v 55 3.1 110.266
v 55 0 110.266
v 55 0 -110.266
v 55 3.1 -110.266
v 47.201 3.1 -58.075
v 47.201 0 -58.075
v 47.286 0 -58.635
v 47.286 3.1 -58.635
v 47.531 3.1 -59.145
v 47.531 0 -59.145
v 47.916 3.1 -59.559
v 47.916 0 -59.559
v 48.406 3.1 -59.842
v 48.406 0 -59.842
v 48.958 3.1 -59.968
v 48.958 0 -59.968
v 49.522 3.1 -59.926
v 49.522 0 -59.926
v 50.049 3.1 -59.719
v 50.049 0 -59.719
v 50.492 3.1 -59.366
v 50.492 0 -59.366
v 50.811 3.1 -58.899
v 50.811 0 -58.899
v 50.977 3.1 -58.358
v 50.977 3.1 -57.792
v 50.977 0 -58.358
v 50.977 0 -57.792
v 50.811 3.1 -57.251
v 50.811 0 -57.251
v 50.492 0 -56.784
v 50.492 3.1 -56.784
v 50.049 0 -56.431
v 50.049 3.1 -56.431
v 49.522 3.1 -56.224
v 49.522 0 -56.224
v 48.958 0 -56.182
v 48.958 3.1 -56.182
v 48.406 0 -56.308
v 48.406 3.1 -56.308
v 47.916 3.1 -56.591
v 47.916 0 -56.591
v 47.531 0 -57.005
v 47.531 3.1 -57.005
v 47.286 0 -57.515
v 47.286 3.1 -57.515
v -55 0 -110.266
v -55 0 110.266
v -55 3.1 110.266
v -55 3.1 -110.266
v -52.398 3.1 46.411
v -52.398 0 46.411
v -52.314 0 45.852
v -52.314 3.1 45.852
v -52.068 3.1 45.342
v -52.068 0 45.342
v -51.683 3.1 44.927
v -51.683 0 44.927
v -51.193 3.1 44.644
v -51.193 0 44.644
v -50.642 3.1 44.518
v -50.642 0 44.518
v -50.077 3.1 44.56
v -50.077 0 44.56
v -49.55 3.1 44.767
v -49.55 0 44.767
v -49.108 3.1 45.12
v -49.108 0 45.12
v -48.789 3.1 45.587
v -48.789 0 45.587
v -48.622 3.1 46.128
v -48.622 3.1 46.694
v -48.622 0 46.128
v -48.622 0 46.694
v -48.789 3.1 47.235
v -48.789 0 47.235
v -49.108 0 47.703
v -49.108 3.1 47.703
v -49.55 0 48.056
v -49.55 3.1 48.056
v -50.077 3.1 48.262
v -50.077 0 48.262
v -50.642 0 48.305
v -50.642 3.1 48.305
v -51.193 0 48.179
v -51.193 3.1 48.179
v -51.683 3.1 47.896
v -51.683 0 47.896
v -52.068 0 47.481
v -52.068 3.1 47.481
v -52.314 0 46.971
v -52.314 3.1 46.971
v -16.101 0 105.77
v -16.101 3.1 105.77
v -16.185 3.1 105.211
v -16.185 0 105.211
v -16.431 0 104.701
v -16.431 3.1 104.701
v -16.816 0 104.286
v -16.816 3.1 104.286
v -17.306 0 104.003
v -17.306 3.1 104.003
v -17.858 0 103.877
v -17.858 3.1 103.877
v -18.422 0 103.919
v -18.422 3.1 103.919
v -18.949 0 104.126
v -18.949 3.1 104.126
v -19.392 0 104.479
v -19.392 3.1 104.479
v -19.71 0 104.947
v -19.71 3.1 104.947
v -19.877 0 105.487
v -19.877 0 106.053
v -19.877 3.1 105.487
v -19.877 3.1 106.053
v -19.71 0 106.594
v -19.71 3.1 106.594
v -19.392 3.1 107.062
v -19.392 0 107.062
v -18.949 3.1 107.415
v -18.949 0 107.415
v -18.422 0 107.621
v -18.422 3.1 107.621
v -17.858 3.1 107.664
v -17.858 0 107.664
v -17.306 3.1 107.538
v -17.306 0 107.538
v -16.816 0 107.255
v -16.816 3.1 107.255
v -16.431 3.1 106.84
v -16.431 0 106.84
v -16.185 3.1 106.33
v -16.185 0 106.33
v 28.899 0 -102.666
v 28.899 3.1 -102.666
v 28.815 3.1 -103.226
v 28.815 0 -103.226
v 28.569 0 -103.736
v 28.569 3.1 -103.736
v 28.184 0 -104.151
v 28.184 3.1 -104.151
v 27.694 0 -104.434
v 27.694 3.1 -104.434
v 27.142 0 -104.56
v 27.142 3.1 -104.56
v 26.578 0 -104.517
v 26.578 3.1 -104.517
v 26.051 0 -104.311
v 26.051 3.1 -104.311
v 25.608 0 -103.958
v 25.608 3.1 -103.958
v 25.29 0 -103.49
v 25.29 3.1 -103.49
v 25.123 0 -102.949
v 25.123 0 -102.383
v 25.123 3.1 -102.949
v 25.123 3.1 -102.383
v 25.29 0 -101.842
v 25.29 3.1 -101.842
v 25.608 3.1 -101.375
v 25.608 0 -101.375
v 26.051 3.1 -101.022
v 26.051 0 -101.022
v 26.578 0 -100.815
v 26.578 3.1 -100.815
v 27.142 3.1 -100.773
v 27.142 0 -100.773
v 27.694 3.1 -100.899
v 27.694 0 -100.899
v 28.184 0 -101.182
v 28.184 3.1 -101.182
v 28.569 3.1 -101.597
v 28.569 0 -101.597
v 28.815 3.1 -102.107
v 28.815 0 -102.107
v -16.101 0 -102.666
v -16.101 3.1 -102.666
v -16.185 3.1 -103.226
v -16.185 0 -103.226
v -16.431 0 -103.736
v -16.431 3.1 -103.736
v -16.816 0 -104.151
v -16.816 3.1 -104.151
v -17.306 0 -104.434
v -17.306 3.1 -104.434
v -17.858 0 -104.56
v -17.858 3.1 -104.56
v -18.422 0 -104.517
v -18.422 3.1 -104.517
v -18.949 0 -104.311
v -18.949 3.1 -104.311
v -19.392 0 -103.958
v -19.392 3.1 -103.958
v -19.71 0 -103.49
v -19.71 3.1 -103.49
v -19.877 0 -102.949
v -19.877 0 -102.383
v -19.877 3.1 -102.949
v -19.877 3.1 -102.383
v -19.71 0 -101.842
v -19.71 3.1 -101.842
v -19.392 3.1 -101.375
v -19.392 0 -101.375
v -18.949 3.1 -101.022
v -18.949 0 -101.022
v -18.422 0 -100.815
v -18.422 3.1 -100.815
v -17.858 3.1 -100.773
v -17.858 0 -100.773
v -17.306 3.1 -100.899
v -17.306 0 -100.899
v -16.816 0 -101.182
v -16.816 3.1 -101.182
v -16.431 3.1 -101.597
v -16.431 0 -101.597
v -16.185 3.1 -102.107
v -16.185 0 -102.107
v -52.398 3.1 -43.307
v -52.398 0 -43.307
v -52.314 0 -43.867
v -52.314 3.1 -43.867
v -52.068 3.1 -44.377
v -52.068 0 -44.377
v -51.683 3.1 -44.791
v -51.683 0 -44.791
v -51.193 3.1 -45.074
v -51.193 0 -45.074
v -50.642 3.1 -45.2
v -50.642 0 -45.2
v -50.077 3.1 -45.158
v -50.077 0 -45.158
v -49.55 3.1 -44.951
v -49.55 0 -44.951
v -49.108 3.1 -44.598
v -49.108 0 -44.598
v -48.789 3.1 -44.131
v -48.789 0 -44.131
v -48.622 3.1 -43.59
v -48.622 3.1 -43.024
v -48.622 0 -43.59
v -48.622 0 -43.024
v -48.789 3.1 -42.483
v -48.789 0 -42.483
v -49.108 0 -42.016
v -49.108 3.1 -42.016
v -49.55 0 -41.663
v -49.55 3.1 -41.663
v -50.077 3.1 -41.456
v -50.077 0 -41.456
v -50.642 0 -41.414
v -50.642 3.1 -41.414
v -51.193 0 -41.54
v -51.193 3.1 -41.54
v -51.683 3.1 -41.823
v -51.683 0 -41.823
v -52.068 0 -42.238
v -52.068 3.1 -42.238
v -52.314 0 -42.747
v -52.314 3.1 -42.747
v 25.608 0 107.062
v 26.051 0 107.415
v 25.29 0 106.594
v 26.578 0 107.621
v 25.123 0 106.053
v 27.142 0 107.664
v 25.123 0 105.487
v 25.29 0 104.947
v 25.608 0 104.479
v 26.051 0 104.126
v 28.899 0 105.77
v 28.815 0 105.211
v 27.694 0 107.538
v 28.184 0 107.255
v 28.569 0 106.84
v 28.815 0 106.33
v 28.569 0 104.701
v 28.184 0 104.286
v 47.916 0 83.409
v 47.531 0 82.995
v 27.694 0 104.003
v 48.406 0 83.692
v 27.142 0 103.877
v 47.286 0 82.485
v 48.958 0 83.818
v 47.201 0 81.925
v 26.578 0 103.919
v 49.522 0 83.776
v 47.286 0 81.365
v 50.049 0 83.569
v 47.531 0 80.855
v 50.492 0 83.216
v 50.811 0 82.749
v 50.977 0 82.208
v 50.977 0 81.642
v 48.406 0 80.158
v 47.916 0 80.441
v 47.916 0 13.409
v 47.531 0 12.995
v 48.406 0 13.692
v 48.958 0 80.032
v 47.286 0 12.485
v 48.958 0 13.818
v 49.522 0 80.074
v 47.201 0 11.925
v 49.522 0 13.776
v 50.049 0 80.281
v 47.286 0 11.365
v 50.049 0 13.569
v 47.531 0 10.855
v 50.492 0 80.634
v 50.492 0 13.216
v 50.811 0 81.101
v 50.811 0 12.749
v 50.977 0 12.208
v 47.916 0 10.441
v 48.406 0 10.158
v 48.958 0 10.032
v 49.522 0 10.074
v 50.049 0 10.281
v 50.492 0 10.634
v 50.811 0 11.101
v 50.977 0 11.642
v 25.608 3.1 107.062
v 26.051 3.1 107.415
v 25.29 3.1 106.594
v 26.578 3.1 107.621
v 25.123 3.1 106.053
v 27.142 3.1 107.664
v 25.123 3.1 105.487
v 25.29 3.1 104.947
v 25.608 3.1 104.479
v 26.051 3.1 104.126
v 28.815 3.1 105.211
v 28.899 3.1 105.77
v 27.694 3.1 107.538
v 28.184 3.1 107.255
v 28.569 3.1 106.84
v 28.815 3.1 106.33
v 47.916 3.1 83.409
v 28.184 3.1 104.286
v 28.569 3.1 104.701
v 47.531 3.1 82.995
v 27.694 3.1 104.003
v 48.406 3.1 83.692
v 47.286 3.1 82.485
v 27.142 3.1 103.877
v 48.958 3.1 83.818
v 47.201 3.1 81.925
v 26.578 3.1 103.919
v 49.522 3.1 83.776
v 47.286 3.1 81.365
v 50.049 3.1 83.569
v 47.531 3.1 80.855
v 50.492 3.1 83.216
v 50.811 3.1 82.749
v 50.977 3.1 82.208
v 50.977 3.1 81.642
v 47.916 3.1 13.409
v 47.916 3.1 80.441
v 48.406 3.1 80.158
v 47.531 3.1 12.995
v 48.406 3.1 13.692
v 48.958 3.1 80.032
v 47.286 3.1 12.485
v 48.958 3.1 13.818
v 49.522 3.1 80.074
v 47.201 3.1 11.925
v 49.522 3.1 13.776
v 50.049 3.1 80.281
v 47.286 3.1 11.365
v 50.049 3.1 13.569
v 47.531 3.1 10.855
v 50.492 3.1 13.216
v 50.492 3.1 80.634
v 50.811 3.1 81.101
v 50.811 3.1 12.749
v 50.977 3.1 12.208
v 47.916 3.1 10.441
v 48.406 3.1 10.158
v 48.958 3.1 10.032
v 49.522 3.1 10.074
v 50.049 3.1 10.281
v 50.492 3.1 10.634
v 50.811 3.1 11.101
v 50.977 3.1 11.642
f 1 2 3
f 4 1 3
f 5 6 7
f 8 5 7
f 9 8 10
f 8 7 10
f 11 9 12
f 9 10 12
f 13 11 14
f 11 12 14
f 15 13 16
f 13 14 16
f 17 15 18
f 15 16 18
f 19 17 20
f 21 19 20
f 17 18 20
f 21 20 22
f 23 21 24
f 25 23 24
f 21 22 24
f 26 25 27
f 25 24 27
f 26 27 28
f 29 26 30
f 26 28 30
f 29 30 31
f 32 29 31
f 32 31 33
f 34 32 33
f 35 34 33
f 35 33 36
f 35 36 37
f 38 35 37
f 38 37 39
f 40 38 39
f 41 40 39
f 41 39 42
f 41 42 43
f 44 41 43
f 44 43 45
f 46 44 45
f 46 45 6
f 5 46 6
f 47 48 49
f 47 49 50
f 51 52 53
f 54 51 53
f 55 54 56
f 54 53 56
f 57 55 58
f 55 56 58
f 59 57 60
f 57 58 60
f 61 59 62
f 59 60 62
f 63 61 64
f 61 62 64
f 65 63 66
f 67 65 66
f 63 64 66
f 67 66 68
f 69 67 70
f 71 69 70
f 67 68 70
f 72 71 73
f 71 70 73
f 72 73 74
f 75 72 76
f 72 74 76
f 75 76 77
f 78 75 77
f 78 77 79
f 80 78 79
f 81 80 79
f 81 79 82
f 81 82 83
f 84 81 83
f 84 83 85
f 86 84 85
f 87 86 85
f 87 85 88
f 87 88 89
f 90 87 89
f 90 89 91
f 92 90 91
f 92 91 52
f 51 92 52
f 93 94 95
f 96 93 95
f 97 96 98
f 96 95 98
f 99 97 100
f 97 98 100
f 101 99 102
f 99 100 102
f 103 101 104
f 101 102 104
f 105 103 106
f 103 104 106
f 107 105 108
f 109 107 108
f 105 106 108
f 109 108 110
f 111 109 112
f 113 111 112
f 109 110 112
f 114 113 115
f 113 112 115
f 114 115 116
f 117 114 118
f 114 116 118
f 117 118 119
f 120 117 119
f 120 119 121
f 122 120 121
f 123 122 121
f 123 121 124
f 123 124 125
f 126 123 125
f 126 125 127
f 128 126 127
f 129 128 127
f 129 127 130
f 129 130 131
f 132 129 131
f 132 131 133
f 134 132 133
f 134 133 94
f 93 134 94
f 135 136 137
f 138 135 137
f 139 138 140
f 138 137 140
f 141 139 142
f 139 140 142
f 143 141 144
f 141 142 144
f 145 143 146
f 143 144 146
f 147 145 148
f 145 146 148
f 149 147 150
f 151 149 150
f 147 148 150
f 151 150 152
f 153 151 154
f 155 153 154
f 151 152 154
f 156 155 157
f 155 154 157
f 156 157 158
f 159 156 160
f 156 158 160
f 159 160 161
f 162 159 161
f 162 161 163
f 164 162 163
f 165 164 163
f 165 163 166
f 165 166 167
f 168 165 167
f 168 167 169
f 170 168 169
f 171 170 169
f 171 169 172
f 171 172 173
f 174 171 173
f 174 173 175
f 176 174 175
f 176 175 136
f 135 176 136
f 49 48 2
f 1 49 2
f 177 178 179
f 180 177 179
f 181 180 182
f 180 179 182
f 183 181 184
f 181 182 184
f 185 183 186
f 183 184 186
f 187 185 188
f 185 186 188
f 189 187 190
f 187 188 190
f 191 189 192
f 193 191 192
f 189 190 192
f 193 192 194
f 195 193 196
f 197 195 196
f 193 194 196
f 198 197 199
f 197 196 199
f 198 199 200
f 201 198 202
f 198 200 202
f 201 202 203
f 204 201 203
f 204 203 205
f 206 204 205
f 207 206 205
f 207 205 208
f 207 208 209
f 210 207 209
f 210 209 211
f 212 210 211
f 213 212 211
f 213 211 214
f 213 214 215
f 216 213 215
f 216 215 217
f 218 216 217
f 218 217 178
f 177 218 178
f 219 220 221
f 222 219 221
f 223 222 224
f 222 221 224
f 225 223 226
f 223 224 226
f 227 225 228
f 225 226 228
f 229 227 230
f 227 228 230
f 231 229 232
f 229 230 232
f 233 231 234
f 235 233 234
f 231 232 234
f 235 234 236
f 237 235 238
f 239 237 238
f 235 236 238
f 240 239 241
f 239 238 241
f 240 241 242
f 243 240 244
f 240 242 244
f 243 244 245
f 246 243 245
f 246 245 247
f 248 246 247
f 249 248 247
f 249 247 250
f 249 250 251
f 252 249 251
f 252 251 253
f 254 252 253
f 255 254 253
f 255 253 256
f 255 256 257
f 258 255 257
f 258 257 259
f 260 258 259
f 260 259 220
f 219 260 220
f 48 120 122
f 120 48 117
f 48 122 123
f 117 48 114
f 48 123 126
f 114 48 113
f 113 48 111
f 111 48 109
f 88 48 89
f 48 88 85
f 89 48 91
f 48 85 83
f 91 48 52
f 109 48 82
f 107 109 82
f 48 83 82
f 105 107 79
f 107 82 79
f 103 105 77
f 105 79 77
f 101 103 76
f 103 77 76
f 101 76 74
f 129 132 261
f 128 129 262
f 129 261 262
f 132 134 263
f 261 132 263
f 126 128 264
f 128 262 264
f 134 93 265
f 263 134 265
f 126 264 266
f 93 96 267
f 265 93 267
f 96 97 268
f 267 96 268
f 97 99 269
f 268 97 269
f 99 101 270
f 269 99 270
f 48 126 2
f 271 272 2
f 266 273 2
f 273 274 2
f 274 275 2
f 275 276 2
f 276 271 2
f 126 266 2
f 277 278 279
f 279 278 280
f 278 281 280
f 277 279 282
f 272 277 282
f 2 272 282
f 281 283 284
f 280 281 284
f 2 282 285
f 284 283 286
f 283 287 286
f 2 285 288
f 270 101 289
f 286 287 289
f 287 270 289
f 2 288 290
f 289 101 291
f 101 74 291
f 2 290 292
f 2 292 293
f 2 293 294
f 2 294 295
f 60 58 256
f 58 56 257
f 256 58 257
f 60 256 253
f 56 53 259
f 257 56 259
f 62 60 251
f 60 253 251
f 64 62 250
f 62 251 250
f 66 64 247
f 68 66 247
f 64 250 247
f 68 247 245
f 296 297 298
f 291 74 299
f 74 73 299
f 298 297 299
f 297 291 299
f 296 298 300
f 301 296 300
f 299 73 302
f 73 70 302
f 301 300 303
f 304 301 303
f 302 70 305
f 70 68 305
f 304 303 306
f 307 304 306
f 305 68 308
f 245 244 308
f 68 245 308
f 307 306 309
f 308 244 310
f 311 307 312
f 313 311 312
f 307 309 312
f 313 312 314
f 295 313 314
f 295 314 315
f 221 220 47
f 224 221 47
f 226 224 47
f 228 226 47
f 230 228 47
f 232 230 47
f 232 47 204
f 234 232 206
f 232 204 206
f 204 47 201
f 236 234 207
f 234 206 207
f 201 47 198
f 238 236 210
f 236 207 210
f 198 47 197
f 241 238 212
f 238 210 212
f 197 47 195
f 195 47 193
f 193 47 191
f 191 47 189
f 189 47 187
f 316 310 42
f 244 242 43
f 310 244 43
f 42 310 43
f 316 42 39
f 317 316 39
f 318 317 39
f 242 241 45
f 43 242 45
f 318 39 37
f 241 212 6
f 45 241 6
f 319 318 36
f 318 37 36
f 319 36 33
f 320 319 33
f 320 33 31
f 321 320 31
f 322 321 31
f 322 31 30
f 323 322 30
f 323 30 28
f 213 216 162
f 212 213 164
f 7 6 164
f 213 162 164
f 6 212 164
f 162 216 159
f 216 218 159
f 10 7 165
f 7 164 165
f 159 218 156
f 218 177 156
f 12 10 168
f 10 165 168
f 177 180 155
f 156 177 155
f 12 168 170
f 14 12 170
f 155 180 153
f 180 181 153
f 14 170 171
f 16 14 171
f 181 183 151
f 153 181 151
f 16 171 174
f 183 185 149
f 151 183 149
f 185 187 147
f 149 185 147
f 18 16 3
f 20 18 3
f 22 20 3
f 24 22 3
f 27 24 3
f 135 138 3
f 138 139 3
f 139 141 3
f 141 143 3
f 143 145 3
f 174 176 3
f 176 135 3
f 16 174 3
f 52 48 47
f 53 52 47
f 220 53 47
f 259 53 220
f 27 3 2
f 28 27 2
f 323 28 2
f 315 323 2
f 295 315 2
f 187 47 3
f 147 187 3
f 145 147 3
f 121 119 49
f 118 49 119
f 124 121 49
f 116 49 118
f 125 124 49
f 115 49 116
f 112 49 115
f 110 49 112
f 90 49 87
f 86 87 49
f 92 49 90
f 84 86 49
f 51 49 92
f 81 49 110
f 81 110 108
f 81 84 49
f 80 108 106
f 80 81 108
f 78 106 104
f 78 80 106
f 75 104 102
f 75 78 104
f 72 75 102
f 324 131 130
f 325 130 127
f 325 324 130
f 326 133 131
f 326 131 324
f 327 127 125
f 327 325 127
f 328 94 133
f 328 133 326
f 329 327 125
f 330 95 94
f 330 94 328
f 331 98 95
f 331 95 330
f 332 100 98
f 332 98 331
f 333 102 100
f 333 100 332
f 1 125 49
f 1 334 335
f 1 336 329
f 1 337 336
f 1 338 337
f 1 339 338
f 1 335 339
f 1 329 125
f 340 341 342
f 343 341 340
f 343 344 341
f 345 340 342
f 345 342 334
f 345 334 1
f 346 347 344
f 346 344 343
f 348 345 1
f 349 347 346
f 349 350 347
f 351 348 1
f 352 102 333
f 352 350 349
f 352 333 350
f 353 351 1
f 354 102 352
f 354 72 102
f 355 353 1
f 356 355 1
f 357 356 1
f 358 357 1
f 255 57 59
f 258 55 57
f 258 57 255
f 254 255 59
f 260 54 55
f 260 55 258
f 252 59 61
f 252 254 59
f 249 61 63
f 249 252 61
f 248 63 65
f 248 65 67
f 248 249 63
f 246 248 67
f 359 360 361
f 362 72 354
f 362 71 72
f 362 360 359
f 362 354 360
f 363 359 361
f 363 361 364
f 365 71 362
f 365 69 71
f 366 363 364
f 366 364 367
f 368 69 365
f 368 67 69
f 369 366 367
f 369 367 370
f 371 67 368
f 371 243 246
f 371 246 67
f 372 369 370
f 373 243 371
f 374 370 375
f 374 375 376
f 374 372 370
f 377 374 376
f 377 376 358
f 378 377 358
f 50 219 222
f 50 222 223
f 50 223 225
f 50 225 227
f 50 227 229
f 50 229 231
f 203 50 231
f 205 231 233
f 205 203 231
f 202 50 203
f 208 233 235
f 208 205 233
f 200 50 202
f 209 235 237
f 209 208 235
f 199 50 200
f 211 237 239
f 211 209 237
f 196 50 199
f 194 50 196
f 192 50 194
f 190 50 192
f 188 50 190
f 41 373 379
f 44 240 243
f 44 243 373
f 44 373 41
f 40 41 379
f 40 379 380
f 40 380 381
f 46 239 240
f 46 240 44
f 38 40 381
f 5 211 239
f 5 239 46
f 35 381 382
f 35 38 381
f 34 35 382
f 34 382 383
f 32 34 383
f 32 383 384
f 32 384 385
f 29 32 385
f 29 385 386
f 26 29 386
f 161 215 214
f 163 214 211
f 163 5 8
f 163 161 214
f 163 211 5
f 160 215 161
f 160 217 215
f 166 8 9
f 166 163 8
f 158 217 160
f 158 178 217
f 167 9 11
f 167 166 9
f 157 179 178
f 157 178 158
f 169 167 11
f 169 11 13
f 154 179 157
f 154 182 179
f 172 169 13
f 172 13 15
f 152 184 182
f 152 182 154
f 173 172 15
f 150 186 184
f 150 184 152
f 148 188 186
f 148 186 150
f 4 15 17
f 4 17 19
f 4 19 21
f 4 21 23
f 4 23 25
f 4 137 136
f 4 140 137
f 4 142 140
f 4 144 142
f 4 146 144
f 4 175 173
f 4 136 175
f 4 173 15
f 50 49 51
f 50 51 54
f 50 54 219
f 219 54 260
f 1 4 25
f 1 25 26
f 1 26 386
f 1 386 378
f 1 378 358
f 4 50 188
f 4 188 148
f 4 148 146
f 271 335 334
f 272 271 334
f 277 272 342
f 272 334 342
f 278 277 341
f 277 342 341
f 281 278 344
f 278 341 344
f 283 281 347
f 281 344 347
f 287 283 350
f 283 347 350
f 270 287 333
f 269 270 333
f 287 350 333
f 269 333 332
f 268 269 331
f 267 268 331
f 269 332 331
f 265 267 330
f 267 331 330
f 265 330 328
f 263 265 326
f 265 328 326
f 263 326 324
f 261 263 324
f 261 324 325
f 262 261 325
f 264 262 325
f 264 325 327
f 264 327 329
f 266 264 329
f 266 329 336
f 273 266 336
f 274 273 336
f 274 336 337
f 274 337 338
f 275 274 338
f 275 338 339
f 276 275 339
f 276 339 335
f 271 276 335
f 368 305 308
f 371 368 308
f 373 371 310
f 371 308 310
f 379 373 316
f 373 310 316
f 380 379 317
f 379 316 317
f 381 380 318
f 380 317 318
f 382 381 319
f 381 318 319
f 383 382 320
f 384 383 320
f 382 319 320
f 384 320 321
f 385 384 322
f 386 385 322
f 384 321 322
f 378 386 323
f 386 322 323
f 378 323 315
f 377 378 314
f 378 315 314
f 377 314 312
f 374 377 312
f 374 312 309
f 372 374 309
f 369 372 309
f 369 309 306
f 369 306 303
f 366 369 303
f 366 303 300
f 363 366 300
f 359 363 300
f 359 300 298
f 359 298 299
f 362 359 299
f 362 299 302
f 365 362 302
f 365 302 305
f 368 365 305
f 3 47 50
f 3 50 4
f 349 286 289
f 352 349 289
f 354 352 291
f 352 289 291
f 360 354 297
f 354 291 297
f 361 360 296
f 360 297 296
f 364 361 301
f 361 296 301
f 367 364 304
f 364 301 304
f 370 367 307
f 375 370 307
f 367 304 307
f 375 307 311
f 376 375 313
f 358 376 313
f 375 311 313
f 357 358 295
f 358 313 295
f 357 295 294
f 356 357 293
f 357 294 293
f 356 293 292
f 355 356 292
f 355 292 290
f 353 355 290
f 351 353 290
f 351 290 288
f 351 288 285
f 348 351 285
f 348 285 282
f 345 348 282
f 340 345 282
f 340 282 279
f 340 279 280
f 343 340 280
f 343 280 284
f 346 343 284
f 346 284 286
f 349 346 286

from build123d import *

# Parameters (mm, degrees)
SKETCH1_W             = 110
SKETCH1_H             = 220.5325
BOSS_EXTRUDE1_DEPTH   = 3.1
F_6_CLEARANCE_HOLE1_D = 3.7973
F_6_CLEARANCE_HOLE3_D = 3.7973


with BuildPart() as part:
    # Sketch1 → Boss-Extrude1 (new body)
    with BuildSketch(Plane(origin=(0, 0, 0), x_dir=(1, 0, 0), z_dir=(0, 1, 0))):
        Rectangle(SKETCH1_W, SKETCH1_H)
    extrude(amount=BOSS_EXTRUDE1_DEPTH)

    # #6 Clearance Hole1 (through all)
    with Locations(Plane(origin=(0, 3.1, 0), x_dir=(1, 0, 0), z_dir=(0, 1, 0))):
        with Locations((49.1, 58.075), (49.1, -11.925), (49.1, -81.925), (-50.4997, -46.411275), (-50.4997, 43.307075)):
            Hole(F_6_CLEARANCE_HOLE1_D / 2)

    # #6 Clearance Hole3 (through all)
    with Locations(Plane(origin=(0, 0, 0), x_dir=(-1, 0, 0), z_dir=(0, -1, 0))):
        with Locations((-27.0003, 102.66625), (17.9997, 102.66625), (-27.0003, -105.77045), (17.9997, -105.77045)):
            Hole(F_6_CLEARANCE_HOLE3_D / 2)


solid = part.part
